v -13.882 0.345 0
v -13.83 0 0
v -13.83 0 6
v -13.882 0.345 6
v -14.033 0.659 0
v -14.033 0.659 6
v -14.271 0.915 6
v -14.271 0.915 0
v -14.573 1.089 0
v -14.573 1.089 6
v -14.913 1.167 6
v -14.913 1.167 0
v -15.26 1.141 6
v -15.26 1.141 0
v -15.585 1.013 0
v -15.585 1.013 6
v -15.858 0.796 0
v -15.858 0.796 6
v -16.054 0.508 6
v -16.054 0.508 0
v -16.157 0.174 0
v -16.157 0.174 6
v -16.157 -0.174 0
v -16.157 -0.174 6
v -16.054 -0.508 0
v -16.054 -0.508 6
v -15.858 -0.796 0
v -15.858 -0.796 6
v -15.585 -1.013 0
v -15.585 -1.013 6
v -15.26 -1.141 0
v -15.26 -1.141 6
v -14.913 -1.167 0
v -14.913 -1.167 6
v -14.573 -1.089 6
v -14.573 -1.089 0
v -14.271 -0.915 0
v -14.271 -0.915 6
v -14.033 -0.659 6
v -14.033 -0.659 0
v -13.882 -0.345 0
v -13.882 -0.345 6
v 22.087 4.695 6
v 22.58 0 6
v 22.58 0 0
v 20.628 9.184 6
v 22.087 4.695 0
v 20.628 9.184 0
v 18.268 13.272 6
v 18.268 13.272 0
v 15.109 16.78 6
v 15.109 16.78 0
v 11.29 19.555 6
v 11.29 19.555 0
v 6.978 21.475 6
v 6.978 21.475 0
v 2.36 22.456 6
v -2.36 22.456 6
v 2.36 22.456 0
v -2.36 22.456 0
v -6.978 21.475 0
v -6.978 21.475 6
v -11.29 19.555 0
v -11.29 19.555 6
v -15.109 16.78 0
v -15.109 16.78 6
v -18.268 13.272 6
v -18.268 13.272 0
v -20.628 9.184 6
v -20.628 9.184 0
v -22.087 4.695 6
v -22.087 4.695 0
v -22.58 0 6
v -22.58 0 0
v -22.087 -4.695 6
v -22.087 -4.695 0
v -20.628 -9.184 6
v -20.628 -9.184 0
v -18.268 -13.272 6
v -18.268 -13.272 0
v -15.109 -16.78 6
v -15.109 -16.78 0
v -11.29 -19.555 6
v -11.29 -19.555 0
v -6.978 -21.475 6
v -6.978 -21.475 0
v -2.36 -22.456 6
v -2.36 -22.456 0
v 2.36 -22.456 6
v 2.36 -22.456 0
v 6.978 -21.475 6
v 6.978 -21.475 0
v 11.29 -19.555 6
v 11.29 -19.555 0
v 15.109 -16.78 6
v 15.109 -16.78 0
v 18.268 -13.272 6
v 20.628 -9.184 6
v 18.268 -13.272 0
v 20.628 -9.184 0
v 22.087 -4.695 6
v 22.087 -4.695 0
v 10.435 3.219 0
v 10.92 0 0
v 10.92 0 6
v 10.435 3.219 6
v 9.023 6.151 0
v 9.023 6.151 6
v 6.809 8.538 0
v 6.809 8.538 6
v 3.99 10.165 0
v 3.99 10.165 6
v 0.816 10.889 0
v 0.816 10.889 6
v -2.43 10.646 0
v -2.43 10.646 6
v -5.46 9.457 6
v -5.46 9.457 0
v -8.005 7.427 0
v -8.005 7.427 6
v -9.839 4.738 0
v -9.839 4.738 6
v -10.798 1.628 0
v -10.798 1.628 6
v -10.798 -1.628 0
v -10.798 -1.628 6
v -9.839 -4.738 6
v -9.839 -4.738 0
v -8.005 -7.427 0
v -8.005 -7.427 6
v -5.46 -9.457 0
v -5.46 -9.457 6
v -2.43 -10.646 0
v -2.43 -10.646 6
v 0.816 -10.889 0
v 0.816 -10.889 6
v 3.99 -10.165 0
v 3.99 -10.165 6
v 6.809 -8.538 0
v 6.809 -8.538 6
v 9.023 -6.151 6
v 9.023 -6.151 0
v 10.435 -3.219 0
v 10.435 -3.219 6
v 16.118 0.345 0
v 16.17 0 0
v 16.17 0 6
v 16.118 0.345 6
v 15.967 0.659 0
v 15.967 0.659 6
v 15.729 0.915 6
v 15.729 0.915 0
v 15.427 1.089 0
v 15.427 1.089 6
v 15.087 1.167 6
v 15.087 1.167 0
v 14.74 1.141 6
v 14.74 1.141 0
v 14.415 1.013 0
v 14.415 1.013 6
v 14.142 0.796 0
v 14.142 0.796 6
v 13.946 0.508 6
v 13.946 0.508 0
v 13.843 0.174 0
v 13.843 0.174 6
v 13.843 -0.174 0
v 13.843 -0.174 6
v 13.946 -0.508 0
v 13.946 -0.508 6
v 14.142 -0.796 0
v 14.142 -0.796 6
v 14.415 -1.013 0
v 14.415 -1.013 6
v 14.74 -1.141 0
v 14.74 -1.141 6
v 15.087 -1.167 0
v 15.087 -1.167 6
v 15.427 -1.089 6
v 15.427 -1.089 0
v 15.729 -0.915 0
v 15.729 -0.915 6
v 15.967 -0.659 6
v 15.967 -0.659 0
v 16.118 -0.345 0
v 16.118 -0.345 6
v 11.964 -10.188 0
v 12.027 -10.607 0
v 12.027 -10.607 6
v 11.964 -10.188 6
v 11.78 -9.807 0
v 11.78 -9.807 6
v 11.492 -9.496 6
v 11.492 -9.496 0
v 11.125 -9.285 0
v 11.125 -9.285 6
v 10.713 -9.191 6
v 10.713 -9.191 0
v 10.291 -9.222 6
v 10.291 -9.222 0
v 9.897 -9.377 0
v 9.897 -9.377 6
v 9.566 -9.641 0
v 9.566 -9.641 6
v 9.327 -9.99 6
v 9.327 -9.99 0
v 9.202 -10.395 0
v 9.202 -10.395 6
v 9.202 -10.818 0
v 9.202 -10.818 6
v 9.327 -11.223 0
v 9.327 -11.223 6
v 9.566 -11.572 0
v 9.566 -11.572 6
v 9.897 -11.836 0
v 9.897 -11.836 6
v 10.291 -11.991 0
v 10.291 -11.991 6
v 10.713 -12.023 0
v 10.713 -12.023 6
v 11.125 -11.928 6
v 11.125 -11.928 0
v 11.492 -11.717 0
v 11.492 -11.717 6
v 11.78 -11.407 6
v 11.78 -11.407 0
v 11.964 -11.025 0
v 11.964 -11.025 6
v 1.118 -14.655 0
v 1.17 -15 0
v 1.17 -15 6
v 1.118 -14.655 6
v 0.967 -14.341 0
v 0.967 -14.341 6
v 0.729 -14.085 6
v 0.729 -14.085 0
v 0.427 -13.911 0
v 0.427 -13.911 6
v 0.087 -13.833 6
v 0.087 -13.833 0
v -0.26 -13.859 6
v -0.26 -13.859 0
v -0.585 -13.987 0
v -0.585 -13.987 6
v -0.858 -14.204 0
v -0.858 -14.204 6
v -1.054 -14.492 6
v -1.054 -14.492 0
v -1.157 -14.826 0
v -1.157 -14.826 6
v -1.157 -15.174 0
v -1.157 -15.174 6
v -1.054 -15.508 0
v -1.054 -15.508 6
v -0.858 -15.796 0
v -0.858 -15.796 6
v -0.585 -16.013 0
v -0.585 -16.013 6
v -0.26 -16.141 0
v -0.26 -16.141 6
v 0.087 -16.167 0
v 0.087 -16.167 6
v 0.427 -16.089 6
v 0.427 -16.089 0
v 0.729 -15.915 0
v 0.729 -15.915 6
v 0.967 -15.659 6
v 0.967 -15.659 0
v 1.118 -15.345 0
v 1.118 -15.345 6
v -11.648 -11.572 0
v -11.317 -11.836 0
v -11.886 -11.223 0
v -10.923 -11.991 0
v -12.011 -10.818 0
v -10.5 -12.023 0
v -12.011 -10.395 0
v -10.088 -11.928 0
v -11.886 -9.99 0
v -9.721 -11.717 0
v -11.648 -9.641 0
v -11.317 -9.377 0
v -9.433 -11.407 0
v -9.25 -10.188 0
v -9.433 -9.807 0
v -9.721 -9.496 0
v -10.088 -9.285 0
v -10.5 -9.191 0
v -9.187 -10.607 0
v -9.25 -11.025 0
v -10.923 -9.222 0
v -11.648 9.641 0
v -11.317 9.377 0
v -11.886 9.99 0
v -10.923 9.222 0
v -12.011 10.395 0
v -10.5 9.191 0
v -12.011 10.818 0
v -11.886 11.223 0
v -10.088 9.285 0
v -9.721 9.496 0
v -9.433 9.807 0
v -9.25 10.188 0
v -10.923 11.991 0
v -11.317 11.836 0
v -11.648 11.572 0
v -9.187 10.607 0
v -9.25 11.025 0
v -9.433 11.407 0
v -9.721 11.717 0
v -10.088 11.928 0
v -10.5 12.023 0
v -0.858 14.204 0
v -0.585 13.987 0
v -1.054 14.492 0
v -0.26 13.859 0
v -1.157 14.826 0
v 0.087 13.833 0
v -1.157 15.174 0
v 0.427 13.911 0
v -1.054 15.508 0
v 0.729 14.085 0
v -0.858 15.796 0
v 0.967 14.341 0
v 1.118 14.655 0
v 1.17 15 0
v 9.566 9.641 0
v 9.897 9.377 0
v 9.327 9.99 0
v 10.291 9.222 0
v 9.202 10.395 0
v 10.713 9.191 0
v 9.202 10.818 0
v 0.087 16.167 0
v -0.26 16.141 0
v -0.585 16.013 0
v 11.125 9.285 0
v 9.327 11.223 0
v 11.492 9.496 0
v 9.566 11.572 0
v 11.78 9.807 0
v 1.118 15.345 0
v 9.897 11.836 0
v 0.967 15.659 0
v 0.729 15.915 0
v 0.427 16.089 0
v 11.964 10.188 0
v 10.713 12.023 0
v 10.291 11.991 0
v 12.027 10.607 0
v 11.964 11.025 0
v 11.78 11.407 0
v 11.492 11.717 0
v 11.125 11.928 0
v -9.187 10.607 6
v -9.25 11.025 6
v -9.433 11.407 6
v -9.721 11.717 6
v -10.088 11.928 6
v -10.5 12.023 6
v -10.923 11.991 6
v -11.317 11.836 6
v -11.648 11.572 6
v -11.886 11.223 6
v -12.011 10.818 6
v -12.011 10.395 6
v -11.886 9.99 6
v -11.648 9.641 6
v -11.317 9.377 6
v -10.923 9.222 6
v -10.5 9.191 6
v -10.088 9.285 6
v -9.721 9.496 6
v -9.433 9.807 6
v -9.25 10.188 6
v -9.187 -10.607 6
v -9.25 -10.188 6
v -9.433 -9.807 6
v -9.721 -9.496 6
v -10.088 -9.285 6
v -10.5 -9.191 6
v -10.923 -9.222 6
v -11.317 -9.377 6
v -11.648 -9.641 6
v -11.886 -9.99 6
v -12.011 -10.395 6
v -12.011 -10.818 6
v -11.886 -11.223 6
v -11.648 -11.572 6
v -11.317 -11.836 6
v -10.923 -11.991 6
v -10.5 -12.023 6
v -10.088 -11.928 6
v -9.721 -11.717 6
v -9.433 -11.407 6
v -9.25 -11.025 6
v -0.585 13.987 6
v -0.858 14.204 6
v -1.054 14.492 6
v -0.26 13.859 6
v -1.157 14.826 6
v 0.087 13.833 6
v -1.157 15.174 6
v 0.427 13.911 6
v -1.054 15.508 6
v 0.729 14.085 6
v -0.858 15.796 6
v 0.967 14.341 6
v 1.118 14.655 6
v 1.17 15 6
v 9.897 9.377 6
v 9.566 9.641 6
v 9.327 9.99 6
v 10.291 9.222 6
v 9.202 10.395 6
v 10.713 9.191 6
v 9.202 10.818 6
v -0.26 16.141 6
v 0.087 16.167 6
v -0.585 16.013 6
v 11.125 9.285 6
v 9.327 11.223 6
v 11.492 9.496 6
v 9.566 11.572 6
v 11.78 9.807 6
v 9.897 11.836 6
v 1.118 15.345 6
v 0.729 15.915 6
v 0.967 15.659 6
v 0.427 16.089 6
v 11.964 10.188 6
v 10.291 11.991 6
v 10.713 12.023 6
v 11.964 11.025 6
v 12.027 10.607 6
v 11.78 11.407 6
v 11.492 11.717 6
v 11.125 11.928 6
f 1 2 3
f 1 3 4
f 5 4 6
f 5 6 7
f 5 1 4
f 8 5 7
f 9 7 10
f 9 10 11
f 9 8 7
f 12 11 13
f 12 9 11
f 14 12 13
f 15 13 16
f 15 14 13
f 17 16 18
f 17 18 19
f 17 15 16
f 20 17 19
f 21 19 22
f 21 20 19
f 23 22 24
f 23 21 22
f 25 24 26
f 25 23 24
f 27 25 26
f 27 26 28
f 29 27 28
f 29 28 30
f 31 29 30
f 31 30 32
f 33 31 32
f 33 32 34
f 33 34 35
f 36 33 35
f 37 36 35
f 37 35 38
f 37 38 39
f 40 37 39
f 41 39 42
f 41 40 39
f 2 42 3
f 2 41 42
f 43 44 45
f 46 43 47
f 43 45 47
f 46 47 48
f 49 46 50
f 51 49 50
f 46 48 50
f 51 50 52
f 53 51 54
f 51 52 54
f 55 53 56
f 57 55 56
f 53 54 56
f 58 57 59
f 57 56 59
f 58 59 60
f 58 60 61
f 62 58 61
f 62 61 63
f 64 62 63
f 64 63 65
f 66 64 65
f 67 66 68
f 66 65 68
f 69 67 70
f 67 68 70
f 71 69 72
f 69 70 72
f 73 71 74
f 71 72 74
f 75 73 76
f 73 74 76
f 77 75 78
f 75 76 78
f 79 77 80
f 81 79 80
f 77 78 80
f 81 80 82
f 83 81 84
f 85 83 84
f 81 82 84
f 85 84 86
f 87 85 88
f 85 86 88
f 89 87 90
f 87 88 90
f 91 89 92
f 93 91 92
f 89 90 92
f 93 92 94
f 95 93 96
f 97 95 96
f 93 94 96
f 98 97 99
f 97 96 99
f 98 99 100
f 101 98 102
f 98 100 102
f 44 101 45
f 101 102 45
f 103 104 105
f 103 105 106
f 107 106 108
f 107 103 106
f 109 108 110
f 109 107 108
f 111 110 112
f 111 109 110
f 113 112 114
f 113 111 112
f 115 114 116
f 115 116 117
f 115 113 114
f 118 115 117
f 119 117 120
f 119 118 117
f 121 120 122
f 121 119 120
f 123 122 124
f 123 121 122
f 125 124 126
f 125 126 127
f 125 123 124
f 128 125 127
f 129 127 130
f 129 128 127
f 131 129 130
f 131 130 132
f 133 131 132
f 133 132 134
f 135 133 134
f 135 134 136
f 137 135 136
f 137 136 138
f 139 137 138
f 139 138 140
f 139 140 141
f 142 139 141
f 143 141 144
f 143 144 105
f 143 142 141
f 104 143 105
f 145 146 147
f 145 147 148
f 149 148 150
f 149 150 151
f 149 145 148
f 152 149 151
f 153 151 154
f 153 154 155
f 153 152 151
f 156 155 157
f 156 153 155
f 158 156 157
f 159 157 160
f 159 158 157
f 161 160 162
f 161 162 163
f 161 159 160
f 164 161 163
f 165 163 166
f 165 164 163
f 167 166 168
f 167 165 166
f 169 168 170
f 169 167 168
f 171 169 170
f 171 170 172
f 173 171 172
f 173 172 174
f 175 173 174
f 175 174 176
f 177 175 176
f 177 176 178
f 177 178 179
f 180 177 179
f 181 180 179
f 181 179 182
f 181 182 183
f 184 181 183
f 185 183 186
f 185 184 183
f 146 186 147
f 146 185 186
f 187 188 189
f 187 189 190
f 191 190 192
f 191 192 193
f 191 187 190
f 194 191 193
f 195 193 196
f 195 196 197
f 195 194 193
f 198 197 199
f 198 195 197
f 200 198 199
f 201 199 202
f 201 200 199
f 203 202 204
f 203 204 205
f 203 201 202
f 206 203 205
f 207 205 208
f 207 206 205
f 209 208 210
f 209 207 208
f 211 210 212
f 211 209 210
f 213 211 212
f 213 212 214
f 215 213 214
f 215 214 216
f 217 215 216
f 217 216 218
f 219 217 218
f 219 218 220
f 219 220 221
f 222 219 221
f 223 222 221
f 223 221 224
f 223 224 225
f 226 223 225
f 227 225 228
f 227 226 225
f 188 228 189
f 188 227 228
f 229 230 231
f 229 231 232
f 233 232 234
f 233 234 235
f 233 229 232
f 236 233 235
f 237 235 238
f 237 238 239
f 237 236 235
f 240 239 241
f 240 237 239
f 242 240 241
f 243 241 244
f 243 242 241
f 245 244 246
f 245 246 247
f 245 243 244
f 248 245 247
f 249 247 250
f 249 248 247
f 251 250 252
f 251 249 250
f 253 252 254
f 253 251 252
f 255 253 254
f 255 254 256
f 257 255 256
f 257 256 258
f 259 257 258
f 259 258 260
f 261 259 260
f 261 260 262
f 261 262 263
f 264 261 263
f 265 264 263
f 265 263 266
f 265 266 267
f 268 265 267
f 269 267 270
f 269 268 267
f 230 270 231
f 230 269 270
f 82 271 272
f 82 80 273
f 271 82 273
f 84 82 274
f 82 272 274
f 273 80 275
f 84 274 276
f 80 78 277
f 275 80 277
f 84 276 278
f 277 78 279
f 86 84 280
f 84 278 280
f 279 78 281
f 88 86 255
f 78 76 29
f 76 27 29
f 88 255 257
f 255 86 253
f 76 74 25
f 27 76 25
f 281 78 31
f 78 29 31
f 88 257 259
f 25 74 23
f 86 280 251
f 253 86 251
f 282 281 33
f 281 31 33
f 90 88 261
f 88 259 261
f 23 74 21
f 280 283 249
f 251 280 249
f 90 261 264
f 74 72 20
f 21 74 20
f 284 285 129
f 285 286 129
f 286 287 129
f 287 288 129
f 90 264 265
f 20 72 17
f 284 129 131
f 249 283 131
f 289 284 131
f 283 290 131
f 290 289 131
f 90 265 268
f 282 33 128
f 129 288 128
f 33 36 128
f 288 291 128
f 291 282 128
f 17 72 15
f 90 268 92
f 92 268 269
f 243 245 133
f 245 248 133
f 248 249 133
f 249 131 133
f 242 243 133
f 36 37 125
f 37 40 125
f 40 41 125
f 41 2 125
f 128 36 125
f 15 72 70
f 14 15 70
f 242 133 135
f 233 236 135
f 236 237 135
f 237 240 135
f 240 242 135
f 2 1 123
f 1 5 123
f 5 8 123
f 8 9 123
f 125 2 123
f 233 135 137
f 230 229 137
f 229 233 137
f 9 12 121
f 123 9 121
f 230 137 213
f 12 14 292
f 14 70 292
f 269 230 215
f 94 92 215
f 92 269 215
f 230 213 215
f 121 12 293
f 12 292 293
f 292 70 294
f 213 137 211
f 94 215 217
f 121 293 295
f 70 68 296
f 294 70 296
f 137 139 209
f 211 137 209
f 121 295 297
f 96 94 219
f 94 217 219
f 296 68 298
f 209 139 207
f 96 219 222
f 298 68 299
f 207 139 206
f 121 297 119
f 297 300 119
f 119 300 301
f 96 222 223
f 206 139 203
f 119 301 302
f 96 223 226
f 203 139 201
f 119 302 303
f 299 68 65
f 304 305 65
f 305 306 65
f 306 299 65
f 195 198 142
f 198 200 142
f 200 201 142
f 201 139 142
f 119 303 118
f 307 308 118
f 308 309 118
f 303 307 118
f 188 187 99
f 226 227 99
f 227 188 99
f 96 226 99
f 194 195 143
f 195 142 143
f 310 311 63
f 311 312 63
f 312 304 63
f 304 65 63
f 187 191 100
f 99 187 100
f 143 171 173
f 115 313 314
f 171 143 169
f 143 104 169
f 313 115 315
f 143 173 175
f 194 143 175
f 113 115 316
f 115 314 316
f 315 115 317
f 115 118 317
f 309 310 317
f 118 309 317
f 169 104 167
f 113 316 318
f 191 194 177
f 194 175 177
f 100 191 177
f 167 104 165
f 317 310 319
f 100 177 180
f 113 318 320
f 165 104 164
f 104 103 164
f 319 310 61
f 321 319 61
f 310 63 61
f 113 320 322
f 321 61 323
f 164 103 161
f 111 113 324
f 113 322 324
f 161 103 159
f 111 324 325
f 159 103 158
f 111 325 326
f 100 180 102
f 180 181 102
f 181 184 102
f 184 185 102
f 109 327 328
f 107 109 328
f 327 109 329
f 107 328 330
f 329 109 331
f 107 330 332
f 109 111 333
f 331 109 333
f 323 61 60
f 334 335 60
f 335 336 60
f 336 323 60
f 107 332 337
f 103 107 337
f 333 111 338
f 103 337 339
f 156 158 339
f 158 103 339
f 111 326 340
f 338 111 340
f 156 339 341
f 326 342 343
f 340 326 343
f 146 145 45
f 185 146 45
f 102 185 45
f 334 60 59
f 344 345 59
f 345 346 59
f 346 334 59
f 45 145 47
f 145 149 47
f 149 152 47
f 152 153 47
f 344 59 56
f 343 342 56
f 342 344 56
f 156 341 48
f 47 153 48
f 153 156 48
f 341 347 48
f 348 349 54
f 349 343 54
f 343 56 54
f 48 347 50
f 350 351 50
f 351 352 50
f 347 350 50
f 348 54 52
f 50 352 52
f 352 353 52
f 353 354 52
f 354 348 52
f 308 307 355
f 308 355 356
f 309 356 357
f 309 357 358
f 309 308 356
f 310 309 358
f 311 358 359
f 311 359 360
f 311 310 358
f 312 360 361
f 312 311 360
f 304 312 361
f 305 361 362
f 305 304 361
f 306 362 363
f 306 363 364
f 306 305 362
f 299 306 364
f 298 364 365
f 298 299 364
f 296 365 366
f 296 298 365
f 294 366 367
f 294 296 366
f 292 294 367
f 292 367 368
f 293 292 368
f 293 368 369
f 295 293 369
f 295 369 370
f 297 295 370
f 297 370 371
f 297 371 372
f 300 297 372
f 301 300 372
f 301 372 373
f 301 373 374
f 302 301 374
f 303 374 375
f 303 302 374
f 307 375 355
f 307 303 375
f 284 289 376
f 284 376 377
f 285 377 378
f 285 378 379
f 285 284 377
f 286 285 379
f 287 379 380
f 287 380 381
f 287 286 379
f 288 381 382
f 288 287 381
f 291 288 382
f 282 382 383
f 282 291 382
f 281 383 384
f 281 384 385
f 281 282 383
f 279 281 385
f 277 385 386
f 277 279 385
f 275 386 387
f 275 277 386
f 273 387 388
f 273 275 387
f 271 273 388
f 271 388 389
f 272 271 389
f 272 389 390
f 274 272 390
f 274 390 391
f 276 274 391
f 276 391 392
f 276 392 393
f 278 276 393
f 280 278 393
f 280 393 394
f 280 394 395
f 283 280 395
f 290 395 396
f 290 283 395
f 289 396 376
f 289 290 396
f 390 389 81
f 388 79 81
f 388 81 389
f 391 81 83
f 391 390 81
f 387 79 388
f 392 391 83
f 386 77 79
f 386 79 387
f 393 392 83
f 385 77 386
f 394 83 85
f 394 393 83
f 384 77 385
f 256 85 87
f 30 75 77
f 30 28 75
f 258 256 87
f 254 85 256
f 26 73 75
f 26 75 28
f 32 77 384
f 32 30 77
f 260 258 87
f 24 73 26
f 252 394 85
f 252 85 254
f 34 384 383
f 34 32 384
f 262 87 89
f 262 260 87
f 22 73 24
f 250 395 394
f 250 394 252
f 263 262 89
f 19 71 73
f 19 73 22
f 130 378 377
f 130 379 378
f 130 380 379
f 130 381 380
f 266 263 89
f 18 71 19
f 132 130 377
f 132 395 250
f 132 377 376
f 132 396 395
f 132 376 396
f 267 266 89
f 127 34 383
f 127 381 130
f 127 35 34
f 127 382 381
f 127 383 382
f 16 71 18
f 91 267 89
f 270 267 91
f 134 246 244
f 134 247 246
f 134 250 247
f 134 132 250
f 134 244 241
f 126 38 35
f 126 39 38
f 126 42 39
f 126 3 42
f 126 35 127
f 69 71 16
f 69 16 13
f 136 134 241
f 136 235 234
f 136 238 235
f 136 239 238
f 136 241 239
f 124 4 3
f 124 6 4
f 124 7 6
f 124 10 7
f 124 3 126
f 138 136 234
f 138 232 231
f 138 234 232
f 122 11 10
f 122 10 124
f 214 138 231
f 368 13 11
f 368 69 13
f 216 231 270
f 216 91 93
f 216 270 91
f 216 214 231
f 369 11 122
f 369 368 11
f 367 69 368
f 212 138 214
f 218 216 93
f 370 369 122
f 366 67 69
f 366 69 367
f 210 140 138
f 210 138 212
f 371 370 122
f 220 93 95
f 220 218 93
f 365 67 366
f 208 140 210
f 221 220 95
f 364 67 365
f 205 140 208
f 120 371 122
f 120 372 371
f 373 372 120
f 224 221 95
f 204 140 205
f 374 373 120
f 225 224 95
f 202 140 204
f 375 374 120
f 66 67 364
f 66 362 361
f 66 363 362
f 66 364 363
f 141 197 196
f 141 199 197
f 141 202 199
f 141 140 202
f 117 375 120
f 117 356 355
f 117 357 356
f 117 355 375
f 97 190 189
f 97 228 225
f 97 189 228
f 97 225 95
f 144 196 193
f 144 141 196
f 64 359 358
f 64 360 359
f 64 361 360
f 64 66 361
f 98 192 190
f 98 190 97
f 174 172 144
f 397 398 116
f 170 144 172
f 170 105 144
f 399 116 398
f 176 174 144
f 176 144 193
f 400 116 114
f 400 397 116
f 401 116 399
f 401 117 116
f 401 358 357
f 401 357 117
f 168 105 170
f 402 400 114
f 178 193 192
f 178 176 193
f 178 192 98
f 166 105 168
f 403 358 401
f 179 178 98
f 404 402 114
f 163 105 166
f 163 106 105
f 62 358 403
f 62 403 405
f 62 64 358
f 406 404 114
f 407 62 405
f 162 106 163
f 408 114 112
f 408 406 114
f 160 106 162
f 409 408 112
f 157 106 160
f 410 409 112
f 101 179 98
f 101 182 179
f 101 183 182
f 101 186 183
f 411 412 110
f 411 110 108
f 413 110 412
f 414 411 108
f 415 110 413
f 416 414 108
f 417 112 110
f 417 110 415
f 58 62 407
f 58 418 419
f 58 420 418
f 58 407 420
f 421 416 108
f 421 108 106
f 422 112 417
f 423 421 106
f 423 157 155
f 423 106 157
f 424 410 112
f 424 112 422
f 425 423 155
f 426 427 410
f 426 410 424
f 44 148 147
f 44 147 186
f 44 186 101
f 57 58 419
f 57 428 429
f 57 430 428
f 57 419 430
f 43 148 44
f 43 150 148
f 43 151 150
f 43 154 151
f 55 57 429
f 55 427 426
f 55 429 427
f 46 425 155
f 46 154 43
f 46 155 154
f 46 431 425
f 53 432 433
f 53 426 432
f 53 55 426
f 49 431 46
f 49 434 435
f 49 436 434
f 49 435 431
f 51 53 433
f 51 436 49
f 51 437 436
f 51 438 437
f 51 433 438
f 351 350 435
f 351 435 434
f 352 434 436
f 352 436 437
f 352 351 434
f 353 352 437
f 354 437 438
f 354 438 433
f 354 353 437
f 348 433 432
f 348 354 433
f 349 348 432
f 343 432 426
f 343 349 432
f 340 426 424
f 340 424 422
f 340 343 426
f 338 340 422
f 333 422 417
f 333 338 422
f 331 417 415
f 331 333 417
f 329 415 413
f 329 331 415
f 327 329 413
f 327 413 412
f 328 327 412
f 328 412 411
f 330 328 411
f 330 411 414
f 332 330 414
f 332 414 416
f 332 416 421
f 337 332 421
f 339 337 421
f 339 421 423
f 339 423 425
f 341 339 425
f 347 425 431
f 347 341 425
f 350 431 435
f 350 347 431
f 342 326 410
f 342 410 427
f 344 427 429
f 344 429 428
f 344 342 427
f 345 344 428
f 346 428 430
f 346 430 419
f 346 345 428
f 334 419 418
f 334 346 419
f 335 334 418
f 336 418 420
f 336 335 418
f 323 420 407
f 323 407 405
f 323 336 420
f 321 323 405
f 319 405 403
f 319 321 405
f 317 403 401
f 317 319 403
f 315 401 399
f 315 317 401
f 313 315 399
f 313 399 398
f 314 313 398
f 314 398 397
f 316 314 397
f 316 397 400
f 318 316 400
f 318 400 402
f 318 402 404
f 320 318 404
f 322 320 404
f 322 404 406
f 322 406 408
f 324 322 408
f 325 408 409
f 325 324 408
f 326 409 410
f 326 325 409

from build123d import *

# Parameters (mm, degrees)
SKETCH1_R           = 22.5
SKETCH1_R_2         = 11
SKETCH1_R_3         = 1.25
SKETCH1_R_4         = 1.5
BOSS_EXTRUDE1_DEPTH = 6
MOVE_FACE1_BY       = 0.08
MOVE_FACE1_2_BY     = 0.08
MOVE_FACE1_3_BY     = 0.08
MOVE_FACE1_4_BY     = 0.08
MOVE_FACE1_5_BY     = 0.08
MOVE_FACE1_6_BY     = 0.08
MOVE_FACE1_7_BY     = 0.08
MOVE_FACE1_8_BY     = 0.08
MOVE_FACE1_9_BY     = 0.08
MOVE_FACE1_10_BY    = 0.08


with BuildPart() as part:
    # Sketch1 → Boss-Extrude1 (new body)
    with BuildSketch(Plane.XY):
        Circle(SKETCH1_R)
        Circle(SKETCH1_R_2, mode=Mode.SUBTRACT)
        with Locations((0, 15)):
            Circle(SKETCH1_R_3, mode=Mode.SUBTRACT)
        with Locations((10.606601718, 10.606601718)):
            Circle(SKETCH1_R_4, mode=Mode.SUBTRACT)
        with Locations((15, 0)):
            Circle(SKETCH1_R_3, mode=Mode.SUBTRACT)
        with Locations((10.606601718, -10.606601718)):
            Circle(SKETCH1_R_4, mode=Mode.SUBTRACT)
        with Locations((0, -15)):
            Circle(SKETCH1_R_3, mode=Mode.SUBTRACT)
        with Locations((-10.606601718, -10.606601718)):
            Circle(SKETCH1_R_4, mode=Mode.SUBTRACT)
        with Locations((-15, 0)):
            Circle(SKETCH1_R_3, mode=Mode.SUBTRACT)
        with Locations((-10.606601718, 10.606601718)):
            Circle(SKETCH1_R_4, mode=Mode.SUBTRACT)
    extrude(amount=BOSS_EXTRUDE1_DEPTH)

    # Move Face1: a curved face moved outward by 0.08
    add(Solid.thicken(part.faces().sort_by_distance((-11, 0, 3))[0], MOVE_FACE1_BY))

    # Move Face1 2: a curved face moved outward by 0.08
    add(Solid.thicken(part.faces().sort_by_distance((-22.5, 0, 3))[0], MOVE_FACE1_2_BY))

    # Move Face1 3: a curved face moved outward by 0.08
    add(Solid.thicken(part.faces().sort_by_distance((-1.25, 15, 3))[0], MOVE_FACE1_3_BY))

    # Move Face1 4: a curved face moved outward by 0.08
    add(Solid.thicken(part.faces().sort_by_distance((9.106601718, 10.606601718, 3))[0], MOVE_FACE1_4_BY))

    # Move Face1 5: a curved face moved outward by 0.08
    add(Solid.thicken(part.faces().sort_by_distance((13.75, 0, 3))[0], MOVE_FACE1_5_BY))

    # Move Face1 6: a curved face moved outward by 0.08
    add(Solid.thicken(part.faces().sort_by_distance((9.106601718, -10.606601718, 3))[0], MOVE_FACE1_6_BY))

    # Move Face1 7: a curved face moved outward by 0.08
    add(Solid.thicken(part.faces().sort_by_distance((-1.25, -15, 3))[0], MOVE_FACE1_7_BY))

    # Move Face1 8: a curved face moved outward by 0.08
    add(Solid.thicken(part.faces().sort_by_distance((-12.106601718, -10.606601718, 3))[0], MOVE_FACE1_8_BY))

    # Move Face1 9: a curved face moved outward by 0.08
    add(Solid.thicken(part.faces().sort_by_distance((-16.25, 0, 3))[0], MOVE_FACE1_9_BY))

    # Move Face1 10: a curved face moved outward by 0.08
    add(Solid.thicken(part.faces().sort_by_distance((-12.106601718, 10.606601718, 3))[0], MOVE_FACE1_10_BY))


solid = part.part
